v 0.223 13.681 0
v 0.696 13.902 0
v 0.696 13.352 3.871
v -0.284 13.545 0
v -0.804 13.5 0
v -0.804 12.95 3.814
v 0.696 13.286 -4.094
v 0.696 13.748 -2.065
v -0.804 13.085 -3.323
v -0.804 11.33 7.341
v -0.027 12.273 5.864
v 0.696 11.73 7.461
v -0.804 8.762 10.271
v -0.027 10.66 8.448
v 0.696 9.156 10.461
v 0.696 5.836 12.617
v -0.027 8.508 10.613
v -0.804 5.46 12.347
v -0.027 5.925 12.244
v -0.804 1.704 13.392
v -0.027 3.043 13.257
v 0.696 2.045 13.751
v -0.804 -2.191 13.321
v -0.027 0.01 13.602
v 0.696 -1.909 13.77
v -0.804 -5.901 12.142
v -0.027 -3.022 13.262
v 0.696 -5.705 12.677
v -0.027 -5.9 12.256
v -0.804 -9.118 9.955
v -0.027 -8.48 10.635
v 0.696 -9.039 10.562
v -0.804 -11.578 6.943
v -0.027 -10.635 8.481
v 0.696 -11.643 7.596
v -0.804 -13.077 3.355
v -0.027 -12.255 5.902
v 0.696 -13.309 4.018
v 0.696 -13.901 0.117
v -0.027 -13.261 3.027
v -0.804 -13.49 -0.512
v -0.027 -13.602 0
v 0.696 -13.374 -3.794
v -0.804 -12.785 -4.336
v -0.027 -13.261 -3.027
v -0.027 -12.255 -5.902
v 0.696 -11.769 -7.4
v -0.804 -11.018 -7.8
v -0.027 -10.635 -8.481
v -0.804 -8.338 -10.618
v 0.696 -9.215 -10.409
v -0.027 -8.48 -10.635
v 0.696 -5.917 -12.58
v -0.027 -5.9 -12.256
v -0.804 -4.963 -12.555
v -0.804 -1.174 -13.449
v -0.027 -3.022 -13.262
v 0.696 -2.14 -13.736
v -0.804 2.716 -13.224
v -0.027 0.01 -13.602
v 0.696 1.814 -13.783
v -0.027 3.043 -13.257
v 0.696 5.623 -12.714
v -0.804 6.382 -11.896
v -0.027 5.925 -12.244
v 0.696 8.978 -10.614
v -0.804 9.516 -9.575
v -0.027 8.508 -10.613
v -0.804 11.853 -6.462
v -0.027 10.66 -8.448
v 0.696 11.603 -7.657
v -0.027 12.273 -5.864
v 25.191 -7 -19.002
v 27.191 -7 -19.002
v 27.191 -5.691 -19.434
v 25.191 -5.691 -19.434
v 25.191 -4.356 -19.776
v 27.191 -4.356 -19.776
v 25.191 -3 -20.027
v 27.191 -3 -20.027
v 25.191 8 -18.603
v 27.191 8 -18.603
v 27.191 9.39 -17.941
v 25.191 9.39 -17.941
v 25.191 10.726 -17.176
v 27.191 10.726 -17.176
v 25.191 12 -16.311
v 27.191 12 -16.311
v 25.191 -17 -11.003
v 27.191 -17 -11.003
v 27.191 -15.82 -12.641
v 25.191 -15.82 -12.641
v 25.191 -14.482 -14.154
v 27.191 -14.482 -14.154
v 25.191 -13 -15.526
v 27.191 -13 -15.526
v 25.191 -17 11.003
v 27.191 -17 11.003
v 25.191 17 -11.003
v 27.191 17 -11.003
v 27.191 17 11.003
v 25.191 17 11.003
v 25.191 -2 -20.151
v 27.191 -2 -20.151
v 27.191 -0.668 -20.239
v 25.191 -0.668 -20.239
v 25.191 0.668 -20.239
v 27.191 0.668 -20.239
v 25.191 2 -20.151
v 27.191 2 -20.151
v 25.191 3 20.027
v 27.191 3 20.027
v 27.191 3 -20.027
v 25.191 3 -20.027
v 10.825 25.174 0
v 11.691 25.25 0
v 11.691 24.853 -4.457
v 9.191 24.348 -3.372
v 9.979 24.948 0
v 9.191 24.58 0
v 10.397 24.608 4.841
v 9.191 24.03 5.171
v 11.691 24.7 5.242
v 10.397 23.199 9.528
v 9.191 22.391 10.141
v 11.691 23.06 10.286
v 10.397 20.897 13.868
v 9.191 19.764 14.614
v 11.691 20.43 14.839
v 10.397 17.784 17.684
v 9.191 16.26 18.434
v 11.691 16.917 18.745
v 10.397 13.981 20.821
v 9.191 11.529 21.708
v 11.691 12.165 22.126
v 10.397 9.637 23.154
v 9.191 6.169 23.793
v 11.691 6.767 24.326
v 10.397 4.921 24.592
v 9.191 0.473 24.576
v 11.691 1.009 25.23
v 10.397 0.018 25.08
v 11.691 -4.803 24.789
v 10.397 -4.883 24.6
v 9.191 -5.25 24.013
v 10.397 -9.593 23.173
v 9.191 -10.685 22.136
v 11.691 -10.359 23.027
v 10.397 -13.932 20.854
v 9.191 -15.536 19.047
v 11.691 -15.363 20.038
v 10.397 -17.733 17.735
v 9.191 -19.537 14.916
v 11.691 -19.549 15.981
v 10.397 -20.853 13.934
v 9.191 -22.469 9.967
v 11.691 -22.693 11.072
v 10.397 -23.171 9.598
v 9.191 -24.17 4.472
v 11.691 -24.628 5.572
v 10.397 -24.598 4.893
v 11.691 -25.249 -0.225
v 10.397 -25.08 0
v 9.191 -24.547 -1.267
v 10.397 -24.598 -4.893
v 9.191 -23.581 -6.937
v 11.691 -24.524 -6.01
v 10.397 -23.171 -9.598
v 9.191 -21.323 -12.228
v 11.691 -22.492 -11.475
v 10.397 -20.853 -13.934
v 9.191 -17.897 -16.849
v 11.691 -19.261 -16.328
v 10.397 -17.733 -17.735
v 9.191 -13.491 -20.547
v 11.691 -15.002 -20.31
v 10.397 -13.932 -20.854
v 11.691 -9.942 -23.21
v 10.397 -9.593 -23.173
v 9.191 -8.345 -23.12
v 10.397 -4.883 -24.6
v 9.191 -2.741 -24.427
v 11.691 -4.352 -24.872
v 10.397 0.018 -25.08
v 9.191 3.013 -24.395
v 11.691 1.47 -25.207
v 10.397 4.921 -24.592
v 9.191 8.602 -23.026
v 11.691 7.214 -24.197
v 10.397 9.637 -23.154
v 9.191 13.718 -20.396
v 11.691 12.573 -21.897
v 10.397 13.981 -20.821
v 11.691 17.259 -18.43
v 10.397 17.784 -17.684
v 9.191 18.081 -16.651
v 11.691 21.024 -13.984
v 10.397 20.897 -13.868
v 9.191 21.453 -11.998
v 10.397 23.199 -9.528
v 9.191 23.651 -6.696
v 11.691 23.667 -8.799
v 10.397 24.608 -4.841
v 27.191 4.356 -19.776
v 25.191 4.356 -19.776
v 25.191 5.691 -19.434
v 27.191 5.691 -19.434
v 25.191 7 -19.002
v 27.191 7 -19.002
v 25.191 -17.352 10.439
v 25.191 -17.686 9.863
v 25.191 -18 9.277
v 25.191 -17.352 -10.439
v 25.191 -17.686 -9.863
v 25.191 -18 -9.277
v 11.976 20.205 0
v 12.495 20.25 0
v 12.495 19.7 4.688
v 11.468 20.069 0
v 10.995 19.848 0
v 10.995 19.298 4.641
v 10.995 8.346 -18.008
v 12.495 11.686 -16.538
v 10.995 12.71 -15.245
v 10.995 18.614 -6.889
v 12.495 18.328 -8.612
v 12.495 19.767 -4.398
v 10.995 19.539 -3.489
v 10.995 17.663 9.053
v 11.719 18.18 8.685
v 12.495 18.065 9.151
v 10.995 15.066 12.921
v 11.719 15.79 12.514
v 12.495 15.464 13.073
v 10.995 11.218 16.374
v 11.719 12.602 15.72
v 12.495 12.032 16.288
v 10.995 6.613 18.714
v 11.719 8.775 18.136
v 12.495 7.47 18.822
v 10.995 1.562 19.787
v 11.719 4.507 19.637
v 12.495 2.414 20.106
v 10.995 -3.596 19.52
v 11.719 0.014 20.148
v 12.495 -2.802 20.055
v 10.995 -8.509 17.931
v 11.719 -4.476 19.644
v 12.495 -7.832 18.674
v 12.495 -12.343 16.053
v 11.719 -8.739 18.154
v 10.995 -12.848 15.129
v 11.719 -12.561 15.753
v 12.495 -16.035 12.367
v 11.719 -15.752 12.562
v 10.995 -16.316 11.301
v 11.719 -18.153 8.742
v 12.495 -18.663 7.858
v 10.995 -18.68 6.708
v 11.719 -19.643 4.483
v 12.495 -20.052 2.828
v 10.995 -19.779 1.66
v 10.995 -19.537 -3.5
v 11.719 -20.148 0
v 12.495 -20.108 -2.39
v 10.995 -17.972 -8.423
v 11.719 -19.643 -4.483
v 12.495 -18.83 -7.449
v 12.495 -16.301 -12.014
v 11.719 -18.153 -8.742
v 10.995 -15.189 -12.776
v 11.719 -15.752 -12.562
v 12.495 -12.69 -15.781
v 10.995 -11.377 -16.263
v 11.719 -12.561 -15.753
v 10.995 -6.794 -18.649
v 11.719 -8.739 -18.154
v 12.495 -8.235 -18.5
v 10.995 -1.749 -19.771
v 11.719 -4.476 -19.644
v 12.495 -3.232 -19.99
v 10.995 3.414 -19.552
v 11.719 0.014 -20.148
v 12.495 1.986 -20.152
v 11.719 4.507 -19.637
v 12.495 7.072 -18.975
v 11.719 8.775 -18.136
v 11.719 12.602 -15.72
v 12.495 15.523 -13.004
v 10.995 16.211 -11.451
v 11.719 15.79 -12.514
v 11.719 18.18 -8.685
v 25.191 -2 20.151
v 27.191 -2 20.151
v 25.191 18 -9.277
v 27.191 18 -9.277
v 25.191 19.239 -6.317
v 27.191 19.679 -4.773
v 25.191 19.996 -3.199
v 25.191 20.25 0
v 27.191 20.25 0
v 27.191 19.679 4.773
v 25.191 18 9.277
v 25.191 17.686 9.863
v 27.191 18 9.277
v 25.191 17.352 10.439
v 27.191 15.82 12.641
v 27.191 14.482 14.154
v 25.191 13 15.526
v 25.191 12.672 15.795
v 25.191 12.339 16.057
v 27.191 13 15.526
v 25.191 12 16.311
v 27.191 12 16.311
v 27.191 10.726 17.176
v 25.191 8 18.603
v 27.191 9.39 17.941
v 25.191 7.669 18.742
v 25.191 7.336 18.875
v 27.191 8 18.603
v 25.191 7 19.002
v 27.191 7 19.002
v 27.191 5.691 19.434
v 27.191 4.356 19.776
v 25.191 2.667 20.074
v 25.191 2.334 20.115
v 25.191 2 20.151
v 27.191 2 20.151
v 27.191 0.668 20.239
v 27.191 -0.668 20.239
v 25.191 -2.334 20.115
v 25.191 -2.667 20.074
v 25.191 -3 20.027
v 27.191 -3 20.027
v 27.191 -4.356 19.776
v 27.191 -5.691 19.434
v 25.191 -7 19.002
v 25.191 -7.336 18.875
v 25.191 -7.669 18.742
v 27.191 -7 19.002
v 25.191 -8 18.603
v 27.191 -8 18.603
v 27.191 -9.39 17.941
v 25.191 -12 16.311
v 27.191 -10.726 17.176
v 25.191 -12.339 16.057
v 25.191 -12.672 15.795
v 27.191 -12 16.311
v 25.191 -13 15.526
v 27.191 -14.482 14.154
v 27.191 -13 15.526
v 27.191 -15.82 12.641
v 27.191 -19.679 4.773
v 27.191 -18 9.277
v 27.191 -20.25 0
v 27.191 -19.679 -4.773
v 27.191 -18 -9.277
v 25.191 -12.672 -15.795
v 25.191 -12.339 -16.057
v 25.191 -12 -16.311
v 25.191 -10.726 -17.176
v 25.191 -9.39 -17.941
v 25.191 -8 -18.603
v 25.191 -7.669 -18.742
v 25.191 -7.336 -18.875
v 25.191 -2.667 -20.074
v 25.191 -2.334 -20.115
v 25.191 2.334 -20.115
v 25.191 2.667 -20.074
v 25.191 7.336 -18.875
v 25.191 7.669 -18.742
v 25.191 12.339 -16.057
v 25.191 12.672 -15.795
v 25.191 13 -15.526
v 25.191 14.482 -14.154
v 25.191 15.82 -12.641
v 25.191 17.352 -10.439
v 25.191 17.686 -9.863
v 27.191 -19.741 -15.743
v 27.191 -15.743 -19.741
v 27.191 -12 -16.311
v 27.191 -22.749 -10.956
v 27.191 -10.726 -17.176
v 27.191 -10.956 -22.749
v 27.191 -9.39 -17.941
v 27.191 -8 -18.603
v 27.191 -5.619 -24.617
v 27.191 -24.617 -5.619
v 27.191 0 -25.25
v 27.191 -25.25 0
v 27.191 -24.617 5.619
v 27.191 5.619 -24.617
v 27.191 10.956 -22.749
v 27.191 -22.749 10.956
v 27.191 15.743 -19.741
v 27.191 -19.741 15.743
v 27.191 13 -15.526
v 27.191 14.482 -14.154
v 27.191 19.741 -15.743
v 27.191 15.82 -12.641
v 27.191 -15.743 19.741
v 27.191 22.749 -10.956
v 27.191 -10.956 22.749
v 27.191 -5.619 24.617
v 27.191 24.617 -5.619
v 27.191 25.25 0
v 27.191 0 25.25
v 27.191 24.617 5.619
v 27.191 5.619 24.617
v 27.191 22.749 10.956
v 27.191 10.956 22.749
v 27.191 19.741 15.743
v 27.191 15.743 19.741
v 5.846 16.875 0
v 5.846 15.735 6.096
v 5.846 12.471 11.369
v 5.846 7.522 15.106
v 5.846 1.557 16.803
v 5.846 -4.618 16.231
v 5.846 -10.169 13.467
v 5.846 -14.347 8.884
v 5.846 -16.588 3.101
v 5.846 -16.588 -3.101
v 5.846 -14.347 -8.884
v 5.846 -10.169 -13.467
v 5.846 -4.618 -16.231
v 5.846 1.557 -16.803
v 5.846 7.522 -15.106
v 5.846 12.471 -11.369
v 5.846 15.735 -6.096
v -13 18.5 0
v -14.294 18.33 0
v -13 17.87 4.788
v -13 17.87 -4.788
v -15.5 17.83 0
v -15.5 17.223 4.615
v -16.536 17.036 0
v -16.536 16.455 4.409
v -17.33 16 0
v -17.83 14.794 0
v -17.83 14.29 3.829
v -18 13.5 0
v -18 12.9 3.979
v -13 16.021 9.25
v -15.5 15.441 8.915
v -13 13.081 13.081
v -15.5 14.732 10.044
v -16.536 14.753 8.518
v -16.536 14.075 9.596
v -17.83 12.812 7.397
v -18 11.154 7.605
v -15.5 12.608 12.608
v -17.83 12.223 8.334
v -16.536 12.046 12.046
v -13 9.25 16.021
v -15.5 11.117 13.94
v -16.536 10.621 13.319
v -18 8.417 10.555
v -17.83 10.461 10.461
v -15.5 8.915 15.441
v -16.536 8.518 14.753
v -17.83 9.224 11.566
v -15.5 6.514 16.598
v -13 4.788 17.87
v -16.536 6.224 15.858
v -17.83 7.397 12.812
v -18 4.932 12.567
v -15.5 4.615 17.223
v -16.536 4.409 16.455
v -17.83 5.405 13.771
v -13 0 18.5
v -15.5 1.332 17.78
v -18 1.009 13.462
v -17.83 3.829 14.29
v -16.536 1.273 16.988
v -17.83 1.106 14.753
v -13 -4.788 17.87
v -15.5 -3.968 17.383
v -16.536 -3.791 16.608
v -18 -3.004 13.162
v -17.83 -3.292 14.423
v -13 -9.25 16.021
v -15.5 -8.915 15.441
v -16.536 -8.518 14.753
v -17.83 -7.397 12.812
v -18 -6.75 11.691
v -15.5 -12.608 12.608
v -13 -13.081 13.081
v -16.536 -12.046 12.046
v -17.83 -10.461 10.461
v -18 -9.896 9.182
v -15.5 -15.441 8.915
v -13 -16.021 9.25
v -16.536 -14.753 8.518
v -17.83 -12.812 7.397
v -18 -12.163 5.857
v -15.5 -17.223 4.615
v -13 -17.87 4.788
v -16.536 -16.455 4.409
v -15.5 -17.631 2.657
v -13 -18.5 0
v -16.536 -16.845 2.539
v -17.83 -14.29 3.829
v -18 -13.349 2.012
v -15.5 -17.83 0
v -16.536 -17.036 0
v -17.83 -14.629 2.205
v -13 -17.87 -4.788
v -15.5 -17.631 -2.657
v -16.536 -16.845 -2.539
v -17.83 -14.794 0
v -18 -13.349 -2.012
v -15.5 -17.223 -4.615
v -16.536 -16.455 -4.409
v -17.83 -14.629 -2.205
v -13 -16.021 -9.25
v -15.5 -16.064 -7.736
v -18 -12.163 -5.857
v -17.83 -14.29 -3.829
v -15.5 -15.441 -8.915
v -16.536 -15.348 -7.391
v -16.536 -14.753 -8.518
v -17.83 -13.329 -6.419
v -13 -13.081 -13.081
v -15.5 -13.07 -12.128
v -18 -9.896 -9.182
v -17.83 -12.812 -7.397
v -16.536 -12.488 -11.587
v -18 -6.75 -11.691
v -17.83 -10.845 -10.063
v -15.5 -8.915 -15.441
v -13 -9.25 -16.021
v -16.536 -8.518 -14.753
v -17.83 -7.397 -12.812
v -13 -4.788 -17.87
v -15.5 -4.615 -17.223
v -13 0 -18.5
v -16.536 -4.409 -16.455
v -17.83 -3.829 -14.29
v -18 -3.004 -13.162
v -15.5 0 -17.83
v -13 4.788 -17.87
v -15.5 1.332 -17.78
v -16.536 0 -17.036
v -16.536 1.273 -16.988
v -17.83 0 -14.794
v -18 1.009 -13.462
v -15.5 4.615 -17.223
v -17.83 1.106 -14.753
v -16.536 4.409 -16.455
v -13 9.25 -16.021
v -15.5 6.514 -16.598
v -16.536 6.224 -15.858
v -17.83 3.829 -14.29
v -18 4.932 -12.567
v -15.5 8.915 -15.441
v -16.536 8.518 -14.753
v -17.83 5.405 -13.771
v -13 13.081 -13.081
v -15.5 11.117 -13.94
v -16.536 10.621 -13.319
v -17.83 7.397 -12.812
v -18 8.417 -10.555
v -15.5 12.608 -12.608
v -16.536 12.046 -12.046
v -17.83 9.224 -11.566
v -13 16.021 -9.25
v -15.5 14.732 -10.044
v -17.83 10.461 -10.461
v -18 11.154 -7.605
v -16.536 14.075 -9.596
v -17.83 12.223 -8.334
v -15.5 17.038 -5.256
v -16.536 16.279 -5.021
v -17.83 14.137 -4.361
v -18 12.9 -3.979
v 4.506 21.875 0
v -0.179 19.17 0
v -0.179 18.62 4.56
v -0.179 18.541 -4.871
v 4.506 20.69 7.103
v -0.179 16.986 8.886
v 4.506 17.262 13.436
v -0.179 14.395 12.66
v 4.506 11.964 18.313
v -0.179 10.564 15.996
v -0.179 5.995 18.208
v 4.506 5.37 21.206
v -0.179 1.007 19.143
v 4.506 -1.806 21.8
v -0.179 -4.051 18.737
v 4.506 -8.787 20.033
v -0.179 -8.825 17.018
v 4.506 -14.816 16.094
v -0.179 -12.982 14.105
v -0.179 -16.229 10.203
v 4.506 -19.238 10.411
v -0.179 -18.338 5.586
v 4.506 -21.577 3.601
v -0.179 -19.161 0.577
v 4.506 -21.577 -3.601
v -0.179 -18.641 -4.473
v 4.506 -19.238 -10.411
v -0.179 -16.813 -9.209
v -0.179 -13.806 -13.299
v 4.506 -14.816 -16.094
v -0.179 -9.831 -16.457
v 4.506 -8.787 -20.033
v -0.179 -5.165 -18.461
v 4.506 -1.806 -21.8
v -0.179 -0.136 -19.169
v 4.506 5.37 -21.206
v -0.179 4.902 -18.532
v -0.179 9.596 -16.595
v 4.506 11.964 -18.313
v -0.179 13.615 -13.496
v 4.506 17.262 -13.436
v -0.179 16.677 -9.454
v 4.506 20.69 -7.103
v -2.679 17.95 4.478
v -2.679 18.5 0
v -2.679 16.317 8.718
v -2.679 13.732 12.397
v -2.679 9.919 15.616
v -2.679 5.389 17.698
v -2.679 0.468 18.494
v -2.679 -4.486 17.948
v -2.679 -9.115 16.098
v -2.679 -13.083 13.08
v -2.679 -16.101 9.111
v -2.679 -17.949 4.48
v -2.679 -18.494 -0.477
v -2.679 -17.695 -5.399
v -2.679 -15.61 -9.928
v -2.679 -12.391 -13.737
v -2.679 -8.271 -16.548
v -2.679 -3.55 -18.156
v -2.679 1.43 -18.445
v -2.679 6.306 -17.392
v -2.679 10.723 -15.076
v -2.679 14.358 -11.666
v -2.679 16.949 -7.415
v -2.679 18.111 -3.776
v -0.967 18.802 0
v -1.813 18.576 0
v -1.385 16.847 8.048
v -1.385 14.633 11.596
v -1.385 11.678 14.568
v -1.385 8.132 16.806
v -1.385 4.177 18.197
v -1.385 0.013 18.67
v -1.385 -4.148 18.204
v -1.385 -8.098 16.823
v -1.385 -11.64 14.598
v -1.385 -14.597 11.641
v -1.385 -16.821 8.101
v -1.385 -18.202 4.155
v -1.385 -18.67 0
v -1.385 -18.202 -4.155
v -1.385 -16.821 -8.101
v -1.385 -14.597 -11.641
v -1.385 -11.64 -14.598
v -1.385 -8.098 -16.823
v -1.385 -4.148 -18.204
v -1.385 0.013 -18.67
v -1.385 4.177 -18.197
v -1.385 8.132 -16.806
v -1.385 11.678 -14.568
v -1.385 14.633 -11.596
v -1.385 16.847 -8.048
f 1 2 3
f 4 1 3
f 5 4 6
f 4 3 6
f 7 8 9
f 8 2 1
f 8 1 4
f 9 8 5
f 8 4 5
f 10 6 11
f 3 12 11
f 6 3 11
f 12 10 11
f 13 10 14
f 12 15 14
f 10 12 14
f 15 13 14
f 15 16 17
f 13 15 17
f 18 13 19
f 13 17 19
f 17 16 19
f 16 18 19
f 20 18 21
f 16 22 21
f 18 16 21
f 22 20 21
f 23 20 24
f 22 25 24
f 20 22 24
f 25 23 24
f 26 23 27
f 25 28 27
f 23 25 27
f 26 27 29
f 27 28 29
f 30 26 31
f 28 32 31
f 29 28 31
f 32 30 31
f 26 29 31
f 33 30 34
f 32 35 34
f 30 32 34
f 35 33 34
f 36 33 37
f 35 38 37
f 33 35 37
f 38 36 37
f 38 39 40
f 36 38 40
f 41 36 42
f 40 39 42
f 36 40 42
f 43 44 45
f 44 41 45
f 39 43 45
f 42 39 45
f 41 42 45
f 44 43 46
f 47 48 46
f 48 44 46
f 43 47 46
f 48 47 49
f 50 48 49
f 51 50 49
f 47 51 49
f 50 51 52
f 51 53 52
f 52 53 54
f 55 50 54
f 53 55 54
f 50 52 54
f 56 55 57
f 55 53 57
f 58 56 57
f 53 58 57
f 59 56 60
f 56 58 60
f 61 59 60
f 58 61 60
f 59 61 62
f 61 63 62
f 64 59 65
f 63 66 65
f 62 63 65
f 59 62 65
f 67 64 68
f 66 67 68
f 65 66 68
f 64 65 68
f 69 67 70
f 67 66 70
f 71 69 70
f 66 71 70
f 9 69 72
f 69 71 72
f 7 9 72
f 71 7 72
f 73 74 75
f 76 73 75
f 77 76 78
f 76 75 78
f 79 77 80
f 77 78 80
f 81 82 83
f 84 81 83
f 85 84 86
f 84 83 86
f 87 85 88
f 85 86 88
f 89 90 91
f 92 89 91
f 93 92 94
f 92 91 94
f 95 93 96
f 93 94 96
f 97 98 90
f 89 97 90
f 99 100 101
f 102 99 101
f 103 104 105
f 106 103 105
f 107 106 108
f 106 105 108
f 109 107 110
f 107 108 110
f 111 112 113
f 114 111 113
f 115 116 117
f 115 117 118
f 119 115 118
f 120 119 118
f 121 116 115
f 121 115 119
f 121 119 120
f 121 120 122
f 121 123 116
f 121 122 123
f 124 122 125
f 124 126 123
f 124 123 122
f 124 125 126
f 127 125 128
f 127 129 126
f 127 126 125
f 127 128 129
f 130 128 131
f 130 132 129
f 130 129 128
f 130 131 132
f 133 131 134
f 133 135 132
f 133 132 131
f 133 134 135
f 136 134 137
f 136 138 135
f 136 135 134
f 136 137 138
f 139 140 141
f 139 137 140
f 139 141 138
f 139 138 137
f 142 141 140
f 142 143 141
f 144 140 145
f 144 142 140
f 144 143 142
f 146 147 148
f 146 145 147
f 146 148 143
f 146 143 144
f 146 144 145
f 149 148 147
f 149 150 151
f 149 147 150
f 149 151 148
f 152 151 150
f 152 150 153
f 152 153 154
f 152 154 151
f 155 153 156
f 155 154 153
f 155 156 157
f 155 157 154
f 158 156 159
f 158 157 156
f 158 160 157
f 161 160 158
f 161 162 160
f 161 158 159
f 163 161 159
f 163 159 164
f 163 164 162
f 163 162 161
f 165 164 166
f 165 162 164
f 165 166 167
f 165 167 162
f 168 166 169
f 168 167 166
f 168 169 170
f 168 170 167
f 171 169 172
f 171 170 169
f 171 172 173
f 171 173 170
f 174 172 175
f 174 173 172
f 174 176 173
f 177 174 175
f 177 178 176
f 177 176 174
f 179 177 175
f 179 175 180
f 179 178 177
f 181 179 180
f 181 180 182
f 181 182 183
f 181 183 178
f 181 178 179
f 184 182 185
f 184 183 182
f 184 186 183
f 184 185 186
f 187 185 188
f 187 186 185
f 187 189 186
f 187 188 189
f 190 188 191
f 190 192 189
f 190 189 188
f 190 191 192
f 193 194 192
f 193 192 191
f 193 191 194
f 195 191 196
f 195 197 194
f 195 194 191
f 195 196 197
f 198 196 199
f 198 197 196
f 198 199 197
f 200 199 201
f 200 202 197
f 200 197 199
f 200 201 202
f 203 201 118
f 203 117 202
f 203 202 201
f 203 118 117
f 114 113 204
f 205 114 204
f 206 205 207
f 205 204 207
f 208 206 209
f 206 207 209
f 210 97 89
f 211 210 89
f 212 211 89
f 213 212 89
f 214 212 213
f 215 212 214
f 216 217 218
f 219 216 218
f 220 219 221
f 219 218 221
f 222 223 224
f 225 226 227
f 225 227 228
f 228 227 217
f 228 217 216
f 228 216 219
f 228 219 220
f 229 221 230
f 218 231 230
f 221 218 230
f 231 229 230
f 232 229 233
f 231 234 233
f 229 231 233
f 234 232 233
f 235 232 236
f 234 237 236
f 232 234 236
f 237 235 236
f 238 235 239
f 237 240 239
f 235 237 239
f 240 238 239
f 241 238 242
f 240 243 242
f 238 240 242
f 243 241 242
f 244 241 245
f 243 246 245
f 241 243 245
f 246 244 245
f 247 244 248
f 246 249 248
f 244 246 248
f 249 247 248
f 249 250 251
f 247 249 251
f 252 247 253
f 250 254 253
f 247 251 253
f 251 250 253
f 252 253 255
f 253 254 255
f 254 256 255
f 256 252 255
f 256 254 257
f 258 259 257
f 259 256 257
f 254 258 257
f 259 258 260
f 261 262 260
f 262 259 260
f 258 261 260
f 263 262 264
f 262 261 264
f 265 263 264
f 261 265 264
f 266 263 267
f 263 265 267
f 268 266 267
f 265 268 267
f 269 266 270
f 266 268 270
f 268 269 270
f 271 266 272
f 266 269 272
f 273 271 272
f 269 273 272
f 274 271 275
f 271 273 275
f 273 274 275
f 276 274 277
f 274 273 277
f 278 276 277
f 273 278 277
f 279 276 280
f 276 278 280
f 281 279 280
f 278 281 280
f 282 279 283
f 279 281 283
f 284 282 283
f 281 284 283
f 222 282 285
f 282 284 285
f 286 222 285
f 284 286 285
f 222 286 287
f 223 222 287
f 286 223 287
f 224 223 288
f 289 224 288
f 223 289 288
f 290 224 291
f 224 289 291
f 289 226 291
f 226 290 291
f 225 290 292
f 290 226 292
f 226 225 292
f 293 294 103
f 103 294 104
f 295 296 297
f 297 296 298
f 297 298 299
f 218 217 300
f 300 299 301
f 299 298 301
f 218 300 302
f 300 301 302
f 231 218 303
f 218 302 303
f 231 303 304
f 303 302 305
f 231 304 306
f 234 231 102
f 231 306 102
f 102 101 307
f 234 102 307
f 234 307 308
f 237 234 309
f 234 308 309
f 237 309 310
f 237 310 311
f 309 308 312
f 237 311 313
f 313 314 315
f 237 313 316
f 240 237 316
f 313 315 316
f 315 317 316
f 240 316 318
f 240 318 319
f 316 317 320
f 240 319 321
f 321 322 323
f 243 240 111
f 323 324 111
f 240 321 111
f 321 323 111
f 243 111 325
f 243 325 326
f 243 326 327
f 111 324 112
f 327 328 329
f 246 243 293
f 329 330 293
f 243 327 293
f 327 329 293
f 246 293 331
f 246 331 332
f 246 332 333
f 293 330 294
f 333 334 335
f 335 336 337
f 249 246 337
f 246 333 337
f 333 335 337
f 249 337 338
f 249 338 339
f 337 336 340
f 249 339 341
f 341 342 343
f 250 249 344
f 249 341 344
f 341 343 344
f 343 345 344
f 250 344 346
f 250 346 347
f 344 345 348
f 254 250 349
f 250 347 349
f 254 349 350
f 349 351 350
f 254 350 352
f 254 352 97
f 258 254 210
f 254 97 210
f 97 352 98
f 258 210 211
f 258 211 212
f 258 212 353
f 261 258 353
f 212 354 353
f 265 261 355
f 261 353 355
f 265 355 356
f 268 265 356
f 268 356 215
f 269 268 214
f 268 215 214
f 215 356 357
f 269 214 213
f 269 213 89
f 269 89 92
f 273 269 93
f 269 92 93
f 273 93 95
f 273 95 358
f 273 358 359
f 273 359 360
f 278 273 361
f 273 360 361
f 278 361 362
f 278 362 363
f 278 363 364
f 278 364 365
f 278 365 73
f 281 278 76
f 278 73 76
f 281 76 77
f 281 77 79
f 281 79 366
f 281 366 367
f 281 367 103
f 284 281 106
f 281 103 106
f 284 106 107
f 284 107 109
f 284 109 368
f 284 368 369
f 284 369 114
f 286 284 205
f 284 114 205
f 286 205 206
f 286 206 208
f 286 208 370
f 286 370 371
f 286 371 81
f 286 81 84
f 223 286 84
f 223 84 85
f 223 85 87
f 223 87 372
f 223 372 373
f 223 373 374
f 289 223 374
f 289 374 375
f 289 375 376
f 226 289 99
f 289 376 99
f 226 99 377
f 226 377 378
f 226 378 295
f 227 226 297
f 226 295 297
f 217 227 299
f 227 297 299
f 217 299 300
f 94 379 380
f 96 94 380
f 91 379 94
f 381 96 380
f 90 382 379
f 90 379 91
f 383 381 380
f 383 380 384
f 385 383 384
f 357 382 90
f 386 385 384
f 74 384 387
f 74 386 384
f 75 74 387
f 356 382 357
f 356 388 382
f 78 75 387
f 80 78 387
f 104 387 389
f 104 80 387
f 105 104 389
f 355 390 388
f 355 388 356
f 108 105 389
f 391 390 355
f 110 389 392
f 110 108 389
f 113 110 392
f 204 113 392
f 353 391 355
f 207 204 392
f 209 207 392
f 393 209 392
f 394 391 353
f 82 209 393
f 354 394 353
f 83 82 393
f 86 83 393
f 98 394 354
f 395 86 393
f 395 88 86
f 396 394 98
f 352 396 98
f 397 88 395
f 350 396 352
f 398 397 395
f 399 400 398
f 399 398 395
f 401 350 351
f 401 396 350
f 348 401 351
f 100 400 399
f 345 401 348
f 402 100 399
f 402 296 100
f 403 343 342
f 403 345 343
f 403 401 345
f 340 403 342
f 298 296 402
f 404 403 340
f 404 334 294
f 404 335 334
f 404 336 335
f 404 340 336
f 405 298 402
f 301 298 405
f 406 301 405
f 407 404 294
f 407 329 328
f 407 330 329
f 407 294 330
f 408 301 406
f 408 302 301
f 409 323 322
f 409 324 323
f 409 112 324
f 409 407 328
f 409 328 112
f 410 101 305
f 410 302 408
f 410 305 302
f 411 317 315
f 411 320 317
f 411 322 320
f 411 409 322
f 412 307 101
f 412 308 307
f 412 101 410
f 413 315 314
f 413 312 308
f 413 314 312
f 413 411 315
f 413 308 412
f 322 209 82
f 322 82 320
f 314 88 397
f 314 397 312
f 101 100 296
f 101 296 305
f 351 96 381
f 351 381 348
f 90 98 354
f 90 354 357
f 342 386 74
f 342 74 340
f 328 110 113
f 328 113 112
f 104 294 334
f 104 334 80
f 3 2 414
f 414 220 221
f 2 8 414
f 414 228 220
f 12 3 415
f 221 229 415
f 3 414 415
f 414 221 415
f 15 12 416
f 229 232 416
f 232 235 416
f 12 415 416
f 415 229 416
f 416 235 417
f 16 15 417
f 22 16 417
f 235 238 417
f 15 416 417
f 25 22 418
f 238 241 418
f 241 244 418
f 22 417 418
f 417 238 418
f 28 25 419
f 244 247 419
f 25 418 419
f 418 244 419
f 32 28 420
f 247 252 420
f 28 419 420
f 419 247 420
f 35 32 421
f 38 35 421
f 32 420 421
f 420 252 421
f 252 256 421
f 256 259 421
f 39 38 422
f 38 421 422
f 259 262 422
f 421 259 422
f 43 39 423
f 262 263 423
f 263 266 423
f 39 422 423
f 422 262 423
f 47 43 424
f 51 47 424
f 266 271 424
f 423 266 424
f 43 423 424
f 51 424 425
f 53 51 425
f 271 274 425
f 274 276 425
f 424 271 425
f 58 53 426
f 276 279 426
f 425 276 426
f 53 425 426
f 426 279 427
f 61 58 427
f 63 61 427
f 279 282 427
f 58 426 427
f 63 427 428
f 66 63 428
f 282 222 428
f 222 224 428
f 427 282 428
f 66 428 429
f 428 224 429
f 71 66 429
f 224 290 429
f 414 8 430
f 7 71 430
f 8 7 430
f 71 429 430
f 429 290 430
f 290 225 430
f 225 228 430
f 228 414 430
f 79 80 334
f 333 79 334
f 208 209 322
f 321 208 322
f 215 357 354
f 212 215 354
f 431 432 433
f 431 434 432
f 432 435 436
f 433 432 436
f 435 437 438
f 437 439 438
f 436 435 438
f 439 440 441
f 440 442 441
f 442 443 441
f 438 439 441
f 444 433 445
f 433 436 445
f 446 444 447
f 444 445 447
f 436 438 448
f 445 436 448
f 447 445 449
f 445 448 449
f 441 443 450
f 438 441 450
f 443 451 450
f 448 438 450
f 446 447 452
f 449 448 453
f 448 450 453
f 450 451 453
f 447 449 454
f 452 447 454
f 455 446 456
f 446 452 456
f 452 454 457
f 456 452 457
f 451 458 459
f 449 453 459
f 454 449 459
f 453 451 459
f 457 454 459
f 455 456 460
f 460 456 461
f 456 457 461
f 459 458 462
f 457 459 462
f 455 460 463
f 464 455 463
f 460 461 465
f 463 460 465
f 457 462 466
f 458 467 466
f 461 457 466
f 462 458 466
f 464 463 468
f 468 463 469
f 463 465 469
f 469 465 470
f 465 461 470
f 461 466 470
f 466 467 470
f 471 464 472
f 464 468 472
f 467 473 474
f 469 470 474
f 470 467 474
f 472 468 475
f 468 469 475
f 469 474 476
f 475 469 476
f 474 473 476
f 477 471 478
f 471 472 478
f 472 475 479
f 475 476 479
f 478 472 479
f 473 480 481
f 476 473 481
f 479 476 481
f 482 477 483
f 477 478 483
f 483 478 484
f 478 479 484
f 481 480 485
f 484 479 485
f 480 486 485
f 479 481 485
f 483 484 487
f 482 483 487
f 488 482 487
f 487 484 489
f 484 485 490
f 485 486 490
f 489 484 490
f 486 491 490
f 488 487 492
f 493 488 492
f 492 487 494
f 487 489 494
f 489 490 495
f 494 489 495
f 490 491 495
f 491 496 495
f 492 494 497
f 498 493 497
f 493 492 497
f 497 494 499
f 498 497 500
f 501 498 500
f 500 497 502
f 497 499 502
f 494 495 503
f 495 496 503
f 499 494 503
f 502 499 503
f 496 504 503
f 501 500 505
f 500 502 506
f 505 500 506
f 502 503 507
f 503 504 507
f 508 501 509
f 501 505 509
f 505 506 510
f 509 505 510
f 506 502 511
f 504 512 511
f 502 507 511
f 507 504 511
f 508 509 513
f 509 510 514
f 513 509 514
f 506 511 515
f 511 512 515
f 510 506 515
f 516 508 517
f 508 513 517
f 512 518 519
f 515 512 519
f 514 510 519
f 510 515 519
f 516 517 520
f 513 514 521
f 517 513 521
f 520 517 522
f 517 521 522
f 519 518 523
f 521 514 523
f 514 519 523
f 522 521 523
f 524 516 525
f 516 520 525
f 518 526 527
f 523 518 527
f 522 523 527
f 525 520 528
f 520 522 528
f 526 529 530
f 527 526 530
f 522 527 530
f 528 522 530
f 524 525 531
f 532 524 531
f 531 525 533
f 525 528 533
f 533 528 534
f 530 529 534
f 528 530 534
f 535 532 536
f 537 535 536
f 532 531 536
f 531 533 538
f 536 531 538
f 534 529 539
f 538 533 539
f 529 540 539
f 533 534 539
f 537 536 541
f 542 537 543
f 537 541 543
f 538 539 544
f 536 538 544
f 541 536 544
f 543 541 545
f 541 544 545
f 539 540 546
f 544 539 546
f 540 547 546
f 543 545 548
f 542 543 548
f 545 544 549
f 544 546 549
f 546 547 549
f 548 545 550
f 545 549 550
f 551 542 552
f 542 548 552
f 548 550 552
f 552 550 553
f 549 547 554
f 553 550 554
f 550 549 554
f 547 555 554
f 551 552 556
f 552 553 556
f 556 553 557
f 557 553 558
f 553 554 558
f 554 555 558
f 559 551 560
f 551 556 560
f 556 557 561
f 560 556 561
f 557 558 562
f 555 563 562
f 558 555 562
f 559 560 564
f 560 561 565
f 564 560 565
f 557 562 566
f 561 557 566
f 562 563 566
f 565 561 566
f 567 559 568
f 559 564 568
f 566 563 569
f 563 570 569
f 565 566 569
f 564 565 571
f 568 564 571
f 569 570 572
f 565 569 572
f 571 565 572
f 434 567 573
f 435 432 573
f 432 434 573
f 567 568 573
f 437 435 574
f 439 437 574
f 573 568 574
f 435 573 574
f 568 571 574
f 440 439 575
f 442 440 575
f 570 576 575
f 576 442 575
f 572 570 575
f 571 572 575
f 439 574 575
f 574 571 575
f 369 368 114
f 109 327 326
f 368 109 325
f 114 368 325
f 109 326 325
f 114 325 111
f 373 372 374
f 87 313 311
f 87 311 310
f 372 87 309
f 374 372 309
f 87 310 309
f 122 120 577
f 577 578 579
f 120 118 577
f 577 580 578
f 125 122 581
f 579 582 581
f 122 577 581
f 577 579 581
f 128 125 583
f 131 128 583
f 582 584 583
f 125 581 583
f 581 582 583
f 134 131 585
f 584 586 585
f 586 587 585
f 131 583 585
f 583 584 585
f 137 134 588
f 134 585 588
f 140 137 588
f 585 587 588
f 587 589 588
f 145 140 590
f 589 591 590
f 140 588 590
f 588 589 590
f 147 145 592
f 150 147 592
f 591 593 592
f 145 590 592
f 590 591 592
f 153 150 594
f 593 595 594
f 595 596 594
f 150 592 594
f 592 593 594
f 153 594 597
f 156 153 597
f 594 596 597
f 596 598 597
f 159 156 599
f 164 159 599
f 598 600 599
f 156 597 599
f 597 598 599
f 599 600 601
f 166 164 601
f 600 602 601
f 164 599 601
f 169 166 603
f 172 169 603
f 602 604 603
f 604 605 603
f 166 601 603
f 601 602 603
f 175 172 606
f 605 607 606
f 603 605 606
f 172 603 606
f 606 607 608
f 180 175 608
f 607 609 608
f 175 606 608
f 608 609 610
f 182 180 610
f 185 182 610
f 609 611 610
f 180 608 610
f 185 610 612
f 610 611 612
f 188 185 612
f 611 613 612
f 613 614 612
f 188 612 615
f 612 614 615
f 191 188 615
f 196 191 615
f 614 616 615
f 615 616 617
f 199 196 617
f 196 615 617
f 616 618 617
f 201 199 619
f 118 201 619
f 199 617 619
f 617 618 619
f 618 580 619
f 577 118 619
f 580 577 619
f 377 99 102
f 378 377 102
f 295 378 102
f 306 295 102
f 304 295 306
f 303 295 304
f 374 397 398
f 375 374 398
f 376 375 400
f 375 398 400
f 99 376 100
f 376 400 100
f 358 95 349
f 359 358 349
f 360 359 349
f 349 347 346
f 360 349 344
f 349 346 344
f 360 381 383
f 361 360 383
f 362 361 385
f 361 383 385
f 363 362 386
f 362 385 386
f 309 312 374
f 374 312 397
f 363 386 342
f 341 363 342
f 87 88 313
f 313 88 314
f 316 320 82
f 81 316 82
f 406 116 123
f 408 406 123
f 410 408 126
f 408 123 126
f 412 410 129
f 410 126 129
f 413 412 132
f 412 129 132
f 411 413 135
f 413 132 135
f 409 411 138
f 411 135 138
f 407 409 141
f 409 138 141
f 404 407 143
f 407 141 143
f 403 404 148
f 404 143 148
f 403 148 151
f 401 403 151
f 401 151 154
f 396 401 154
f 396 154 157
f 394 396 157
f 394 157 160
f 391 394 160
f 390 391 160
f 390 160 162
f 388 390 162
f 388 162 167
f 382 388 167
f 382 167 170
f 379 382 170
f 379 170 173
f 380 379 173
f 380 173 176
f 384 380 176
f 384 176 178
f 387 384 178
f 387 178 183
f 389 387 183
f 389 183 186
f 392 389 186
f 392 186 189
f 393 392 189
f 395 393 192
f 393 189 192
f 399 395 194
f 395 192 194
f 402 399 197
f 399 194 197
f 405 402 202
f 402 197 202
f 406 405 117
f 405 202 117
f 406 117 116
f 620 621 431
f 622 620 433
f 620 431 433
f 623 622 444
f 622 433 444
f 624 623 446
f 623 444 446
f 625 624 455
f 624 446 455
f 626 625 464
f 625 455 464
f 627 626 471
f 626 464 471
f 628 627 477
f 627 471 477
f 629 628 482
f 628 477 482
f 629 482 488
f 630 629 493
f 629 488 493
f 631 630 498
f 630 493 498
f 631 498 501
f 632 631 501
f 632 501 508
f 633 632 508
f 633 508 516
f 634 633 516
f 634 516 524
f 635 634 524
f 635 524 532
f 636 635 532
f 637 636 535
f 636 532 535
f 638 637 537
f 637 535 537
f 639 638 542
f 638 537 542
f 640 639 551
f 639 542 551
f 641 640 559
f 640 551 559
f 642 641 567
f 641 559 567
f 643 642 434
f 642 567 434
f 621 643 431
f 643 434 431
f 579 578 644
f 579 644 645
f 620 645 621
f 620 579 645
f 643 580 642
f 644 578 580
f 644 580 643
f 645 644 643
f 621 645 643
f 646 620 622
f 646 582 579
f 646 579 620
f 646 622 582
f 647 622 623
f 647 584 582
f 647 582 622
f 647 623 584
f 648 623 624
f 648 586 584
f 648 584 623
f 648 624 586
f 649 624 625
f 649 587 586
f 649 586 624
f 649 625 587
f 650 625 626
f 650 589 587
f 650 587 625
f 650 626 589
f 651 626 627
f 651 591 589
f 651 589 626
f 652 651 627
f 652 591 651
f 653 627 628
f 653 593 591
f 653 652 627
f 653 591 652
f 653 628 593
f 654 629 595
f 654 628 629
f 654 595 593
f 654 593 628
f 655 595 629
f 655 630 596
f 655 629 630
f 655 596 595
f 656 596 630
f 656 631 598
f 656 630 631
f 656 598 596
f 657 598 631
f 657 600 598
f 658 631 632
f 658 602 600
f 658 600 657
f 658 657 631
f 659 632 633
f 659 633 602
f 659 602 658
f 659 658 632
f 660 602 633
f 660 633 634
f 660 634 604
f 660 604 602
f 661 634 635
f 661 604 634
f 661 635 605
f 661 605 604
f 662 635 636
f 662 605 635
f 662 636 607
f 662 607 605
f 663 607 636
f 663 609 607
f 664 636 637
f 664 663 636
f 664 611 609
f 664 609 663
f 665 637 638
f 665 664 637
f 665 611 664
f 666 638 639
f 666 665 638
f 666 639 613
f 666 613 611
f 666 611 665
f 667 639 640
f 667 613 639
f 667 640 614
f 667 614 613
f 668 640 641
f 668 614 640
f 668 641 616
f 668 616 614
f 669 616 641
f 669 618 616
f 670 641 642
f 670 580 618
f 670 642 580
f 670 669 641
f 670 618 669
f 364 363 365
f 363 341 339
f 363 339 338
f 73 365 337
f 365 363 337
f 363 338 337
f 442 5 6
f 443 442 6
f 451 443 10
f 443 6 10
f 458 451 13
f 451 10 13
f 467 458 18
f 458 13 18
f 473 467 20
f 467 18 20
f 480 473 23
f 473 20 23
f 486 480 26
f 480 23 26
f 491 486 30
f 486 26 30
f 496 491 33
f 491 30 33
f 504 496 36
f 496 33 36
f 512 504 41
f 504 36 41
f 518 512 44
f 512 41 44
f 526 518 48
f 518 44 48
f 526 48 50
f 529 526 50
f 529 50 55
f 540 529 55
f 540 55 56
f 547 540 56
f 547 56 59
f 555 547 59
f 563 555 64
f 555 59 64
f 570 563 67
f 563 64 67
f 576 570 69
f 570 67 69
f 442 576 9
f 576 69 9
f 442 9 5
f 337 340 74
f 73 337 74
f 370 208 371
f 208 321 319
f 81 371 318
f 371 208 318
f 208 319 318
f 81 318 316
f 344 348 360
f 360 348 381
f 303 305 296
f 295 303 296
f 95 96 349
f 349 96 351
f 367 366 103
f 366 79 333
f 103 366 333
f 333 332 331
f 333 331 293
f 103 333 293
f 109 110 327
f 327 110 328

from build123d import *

# Parameters (mm, degrees)
F2_R     = 25.25
F3_DEPTH = 2
F5_DEPTH = 2
F6_R     = 4.99999
F7_R     = 3


# Not quite as in the source:
# - a fillet or chamfer is up to 0.001 mm smaller than in the source, because OpenCascade refuses the exact size
# - a feature names something its author has since deleted; it is built from what else it names


with BuildPart() as f1:
    # F0 (on Top) → F1 (revolve)
    with BuildSketch(Plane.XY):
        Polygon((-18, 18.5), (-18, 13.5), (0, 13.5), (11.6913429511, 20.25), (25.1913429511, 20.25), (25.1913429511, 25.25), (10.3515969889, 25.25), (-1.3397459622, 18.5), align=None)
    revolve(axis=Axis((-8.7595172226, 0, 0), (1, 0, 0)))

    # F2 (on face) → F3 (join)
    with BuildSketch(Plane.YZ.offset(25.1913429511)):
        Circle(F2_R)
    extrude(amount=F3_DEPTH)

    # F4 (on face) → F5 (cut, through all)
    with BuildSketch(Plane.YZ.offset(27.1913429511)):
        with BuildLine():
            ThreePointArc((17, 11.0028405423), (15.1695473581, 13.4144449363), (13, 15.5261875552))
            Line((13, 15.5261875552), (13, -15.5261875552))
            ThreePointArc((13, -15.5261875552), (15.1695473581, -13.4144449363), (17, -11.0028405423))
            Line((17, -11.0028405423), (17, 11.0028405423))
        make_face()
        with BuildLine():
            ThreePointArc((12, 16.3114223782), (10.0654136275, 17.5712819255), (8, 18.6027551723))
            Line((8, 18.6027551723), (8, -18.6027551723))
            ThreePointArc((8, -18.6027551723), (10.0654136275, -17.5712819255), (12, -16.3114223782))
            Line((12, -16.3114223782), (12, 16.3114223782))
        make_face()
        with BuildLine():
            ThreePointArc((7, 19.0016446657), (5.0261919098, 19.6163170571), (3, 20.0265448842))
            Line((3, 20.0265448842), (3, -20.0265448842))
            ThreePointArc((3, -20.0265448842), (5.0261919098, -19.6163170571), (7, -19.0016446657))
            Line((7, -19.0016446657), (7, 19.0016446657))
        make_face()
        with BuildLine():
            ThreePointArc((2, 20.1509925314), (0, 20.25), (-2, 20.1509925314))
            Line((-2, 20.1509925314), (-2, -20.1509925314))
            ThreePointArc((-2, -20.1509925314), (0, -20.25), (2, -20.1509925314))
            Line((2, -20.1509925314), (2, 20.1509925314))
        make_face()
        with BuildLine():
            Line((-3, -20.0265448842), (-3, 20.0265448842))
            ThreePointArc((-3, 20.0265448842), (-5.0261919098, 19.6163170571), (-7, 19.0016446657))
            Line((-7, 19.0016446657), (-7, -19.0016446657))
            ThreePointArc((-7, -19.0016446657), (-5.0261919098, -19.6163170571), (-3, -20.0265448842))
        make_face()
        with BuildLine():
            Line((-8, -18.6027551723), (-8, 18.6027551723))
            ThreePointArc((-8, 18.6027551723), (-10.0654136275, 17.5712819255), (-12, 16.3114223782))
            Line((-12, 16.3114223782), (-12, -16.3114223782))
            ThreePointArc((-12, -16.3114223782), (-10.0654136275, -17.5712819255), (-8, -18.6027551723))
        make_face()
        with BuildLine():
            Line((-13, -15.5261875552), (-13, 15.5261875552))
            ThreePointArc((-13, 15.5261875552), (-15.1695473581, 13.4144449363), (-17, 11.0028405423))
            Line((-17, 11.0028405423), (-17, -11.0028405423))
            ThreePointArc((-17, -11.0028405423), (-15.1695473581, -13.4144449363), (-13, -15.5261875552))
        make_face()
        with BuildLine():
            Line((-18, -9.2769876576), (-18, 9.2769876576))
            ThreePointArc((-18, 9.2769876576), (-20.25, 0), (-18, -9.2769876576))
        make_face()
        with BuildLine():
            ThreePointArc((20.25, 0), (19.6794626451, 4.772970773), (18, 9.2769876576))
            Line((18, 9.2769876576), (18, -9.2769876576))
            ThreePointArc((18, -9.2769876576), (19.6794626451, -4.772970773), (20.25, 0))
        make_face()
    extrude(amount=-F5_DEPTH, mode=Mode.SUBTRACT)

    # F6 (radius 5 in the source; OpenCascade refuses exactly that, so slightly less here)
    f6_edges = [f1.edges().sort_by_distance(p)[0] for p in [
        (-18, -18.5, 0),
        (-1.339746, -18.5, 0),
        (10.351597, -25.25, 0),
    ]]
    fillet(f6_edges, radius=F6_R)

    # F7
    f7_edges = [f1.edges().sort_by_distance(p)[0] for p in [
        (11.691343, -20.25, 0),
        (0, -13.5, 0),
    ]]
    fillet(f7_edges, radius=F7_R)


solid = f1.part
